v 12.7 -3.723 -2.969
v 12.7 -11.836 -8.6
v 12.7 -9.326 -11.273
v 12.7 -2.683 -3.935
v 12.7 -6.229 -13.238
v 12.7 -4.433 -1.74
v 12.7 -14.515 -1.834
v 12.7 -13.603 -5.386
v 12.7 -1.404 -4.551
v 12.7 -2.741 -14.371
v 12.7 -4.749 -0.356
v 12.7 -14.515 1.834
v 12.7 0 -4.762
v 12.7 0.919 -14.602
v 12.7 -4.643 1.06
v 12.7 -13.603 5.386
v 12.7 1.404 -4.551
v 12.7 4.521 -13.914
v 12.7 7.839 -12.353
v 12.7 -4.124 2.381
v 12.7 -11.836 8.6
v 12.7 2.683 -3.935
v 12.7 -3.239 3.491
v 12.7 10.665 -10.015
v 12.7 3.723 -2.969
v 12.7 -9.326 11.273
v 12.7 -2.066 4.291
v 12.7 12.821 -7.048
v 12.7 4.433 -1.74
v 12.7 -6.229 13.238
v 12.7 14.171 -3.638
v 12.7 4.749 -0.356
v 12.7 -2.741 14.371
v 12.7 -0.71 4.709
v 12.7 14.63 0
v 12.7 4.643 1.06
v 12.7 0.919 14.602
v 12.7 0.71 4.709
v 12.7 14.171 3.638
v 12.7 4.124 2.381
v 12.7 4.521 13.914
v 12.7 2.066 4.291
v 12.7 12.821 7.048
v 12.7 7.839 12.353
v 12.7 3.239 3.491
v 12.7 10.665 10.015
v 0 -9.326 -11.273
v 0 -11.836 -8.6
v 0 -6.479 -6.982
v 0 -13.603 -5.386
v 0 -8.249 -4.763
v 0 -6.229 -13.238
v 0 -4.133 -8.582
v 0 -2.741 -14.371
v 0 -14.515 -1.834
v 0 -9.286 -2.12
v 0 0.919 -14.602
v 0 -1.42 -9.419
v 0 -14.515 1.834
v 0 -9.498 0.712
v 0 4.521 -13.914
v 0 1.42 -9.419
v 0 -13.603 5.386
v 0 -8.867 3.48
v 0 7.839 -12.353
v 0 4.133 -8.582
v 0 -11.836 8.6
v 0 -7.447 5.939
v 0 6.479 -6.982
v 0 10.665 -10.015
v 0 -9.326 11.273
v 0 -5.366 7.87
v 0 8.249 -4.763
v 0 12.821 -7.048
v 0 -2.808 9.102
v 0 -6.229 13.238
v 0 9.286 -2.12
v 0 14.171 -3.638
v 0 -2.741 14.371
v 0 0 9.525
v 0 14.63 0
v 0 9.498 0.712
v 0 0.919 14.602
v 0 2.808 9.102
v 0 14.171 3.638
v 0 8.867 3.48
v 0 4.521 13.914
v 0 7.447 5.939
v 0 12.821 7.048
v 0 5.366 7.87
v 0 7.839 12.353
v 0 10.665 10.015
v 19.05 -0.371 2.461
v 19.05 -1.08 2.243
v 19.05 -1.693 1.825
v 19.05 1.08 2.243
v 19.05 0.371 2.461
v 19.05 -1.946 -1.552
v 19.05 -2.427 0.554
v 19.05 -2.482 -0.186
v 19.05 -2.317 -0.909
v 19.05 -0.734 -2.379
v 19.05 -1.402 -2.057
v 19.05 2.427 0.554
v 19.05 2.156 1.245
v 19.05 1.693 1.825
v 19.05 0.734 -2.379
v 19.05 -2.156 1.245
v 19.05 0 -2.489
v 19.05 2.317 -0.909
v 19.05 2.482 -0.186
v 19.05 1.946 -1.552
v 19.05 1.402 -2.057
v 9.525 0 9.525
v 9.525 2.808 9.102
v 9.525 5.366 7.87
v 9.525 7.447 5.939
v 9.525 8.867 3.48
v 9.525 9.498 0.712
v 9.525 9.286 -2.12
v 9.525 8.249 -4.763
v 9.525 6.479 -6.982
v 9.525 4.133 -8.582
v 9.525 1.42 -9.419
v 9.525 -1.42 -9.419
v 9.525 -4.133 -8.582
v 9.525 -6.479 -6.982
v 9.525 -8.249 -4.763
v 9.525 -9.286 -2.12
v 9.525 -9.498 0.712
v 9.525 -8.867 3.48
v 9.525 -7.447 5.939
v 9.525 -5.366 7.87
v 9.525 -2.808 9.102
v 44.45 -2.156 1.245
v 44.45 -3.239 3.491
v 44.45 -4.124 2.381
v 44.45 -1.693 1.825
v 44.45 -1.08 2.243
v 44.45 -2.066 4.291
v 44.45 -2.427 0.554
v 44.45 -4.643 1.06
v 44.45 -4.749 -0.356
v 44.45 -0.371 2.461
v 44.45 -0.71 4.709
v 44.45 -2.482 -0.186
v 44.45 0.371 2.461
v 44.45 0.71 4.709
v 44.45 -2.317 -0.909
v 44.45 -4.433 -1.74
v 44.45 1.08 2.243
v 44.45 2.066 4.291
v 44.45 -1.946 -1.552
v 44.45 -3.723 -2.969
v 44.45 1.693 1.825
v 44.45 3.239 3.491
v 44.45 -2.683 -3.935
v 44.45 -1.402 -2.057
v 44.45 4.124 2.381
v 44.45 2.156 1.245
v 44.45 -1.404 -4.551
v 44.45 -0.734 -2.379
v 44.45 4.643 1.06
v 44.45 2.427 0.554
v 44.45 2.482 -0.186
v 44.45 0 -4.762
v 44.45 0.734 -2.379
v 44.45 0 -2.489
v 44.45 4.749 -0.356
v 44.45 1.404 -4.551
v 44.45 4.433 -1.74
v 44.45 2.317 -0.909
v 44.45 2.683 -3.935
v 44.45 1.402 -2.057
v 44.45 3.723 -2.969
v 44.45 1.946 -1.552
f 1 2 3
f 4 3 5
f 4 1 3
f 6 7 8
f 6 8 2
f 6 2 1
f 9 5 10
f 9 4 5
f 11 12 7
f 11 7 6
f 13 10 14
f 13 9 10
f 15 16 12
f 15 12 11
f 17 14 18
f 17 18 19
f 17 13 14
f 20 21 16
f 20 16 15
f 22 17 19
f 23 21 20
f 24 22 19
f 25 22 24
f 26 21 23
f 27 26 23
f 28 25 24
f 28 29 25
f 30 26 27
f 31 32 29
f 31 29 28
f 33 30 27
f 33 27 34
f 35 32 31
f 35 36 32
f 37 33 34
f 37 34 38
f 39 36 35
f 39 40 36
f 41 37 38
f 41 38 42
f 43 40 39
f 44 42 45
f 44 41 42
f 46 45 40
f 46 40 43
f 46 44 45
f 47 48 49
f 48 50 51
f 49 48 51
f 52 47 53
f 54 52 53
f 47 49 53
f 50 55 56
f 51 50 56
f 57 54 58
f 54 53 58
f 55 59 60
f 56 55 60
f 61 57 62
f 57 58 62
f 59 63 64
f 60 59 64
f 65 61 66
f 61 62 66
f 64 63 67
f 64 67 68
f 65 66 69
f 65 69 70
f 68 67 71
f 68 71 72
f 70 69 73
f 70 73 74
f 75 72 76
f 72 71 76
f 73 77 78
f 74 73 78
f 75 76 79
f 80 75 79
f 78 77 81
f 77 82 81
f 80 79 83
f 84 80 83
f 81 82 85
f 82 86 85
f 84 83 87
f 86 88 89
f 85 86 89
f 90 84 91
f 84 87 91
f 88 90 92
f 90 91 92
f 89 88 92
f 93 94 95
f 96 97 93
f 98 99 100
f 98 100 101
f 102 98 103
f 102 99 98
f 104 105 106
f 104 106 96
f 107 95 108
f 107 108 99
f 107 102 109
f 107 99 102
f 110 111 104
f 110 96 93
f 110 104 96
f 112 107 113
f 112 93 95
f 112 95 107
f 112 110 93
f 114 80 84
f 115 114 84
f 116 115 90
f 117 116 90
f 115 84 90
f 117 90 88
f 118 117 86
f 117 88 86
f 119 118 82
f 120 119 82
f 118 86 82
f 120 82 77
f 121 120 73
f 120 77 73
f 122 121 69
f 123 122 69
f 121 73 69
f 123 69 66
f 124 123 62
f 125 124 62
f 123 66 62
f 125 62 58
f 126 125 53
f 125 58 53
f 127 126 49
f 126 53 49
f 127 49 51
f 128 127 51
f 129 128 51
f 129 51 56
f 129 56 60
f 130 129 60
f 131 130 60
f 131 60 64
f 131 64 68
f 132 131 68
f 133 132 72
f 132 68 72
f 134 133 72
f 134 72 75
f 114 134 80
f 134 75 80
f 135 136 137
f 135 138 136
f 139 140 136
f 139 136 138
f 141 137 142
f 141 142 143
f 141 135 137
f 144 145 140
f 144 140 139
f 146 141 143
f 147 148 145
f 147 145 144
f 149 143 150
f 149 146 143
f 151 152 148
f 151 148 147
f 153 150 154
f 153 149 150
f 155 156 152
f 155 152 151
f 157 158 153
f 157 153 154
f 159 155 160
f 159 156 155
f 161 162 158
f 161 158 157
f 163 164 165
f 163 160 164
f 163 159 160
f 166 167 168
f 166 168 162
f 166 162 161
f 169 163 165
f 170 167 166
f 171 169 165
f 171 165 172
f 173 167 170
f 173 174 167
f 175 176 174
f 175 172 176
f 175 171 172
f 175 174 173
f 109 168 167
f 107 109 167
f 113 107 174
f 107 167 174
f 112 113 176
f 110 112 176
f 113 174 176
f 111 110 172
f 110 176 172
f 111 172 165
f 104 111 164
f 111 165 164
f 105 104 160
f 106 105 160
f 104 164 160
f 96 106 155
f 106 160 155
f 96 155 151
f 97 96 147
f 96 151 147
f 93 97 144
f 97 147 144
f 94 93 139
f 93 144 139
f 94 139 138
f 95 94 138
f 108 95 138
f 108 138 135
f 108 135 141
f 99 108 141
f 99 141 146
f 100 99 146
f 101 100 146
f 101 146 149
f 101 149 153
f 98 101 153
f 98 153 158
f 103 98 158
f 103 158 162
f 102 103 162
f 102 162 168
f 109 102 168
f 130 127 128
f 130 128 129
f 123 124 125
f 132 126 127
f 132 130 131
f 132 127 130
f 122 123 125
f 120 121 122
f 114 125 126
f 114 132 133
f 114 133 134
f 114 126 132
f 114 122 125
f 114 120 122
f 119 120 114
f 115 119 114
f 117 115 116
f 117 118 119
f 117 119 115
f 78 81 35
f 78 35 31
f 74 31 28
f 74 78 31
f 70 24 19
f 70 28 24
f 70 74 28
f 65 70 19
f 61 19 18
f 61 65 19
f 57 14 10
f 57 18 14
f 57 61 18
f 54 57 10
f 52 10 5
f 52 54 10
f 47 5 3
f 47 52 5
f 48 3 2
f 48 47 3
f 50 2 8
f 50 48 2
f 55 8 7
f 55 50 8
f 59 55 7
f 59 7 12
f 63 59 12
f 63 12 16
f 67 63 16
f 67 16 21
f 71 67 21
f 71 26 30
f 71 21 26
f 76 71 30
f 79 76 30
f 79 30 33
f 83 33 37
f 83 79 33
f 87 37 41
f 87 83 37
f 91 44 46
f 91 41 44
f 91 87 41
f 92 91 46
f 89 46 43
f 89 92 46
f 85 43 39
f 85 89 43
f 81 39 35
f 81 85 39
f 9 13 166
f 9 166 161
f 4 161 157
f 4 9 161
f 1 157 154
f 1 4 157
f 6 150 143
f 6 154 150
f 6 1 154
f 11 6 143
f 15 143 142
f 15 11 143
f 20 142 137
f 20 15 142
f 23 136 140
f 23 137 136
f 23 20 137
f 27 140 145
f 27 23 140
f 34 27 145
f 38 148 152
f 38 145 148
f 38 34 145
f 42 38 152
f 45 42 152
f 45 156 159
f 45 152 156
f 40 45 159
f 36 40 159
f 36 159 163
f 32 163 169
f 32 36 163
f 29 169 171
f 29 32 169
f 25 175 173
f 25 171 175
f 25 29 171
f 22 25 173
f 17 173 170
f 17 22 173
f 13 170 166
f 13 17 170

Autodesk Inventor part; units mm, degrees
ref_plane "YZ Plane" through (0, 0, 0) normal (1, 0, 0) x (0, 1, 0)
ref_plane "XZ Plane" through (0, 0, 0) normal (0, 1, 0) x (-1, 0, 0)
ref_plane "XY Plane" through (0, 0, 0) normal (0, 0, 1) x (1, 0, 0)
sketch "Sketch3" plane through (0, 0, 0) normal (1, 0, 0) x (0, 1, 0)
  circle A0 centre (0, 0) radius 15.875 construction
  circle A1 centre (0, 0) radius 14.6304
  dimension "d8" = 31.75
  dimension "d9" = 1.2446
extrude "Extrusion3" add sketch "Sketch3" along normal blind 12.7
sketch "Sketch4" plane through (12.7, 0, 0) normal (1, 0, 0) x (0, 0, -1)
  circle A0 centre (0, 0) radius 4.7625
  dimension "d12" = 9.525
extrude "Extrusion4" add sketch "Sketch4" along normal blind 31.75
sketch "Sketch5" plane through (44.45, 0, 0) normal (1, 0, 0) x (0, 0, -1)
  circle A0 centre (0, 0) radius 2.4892
  dimension "d15" = 4.9784
extrude "Extrusion5" cut sketch "Sketch5" against normal blind 25.4
sketch "Sketch6" plane through (0, 0, 0) normal (-1, 0, 0) x (0, 0, 1)
  circle A0 centre (0, 0) radius 9.525
  dimension "d18" = 19.05
extrude "Extrusion6" cut sketch "Sketch6" against normal blind 9.525
properties part number "Long roller plug"
